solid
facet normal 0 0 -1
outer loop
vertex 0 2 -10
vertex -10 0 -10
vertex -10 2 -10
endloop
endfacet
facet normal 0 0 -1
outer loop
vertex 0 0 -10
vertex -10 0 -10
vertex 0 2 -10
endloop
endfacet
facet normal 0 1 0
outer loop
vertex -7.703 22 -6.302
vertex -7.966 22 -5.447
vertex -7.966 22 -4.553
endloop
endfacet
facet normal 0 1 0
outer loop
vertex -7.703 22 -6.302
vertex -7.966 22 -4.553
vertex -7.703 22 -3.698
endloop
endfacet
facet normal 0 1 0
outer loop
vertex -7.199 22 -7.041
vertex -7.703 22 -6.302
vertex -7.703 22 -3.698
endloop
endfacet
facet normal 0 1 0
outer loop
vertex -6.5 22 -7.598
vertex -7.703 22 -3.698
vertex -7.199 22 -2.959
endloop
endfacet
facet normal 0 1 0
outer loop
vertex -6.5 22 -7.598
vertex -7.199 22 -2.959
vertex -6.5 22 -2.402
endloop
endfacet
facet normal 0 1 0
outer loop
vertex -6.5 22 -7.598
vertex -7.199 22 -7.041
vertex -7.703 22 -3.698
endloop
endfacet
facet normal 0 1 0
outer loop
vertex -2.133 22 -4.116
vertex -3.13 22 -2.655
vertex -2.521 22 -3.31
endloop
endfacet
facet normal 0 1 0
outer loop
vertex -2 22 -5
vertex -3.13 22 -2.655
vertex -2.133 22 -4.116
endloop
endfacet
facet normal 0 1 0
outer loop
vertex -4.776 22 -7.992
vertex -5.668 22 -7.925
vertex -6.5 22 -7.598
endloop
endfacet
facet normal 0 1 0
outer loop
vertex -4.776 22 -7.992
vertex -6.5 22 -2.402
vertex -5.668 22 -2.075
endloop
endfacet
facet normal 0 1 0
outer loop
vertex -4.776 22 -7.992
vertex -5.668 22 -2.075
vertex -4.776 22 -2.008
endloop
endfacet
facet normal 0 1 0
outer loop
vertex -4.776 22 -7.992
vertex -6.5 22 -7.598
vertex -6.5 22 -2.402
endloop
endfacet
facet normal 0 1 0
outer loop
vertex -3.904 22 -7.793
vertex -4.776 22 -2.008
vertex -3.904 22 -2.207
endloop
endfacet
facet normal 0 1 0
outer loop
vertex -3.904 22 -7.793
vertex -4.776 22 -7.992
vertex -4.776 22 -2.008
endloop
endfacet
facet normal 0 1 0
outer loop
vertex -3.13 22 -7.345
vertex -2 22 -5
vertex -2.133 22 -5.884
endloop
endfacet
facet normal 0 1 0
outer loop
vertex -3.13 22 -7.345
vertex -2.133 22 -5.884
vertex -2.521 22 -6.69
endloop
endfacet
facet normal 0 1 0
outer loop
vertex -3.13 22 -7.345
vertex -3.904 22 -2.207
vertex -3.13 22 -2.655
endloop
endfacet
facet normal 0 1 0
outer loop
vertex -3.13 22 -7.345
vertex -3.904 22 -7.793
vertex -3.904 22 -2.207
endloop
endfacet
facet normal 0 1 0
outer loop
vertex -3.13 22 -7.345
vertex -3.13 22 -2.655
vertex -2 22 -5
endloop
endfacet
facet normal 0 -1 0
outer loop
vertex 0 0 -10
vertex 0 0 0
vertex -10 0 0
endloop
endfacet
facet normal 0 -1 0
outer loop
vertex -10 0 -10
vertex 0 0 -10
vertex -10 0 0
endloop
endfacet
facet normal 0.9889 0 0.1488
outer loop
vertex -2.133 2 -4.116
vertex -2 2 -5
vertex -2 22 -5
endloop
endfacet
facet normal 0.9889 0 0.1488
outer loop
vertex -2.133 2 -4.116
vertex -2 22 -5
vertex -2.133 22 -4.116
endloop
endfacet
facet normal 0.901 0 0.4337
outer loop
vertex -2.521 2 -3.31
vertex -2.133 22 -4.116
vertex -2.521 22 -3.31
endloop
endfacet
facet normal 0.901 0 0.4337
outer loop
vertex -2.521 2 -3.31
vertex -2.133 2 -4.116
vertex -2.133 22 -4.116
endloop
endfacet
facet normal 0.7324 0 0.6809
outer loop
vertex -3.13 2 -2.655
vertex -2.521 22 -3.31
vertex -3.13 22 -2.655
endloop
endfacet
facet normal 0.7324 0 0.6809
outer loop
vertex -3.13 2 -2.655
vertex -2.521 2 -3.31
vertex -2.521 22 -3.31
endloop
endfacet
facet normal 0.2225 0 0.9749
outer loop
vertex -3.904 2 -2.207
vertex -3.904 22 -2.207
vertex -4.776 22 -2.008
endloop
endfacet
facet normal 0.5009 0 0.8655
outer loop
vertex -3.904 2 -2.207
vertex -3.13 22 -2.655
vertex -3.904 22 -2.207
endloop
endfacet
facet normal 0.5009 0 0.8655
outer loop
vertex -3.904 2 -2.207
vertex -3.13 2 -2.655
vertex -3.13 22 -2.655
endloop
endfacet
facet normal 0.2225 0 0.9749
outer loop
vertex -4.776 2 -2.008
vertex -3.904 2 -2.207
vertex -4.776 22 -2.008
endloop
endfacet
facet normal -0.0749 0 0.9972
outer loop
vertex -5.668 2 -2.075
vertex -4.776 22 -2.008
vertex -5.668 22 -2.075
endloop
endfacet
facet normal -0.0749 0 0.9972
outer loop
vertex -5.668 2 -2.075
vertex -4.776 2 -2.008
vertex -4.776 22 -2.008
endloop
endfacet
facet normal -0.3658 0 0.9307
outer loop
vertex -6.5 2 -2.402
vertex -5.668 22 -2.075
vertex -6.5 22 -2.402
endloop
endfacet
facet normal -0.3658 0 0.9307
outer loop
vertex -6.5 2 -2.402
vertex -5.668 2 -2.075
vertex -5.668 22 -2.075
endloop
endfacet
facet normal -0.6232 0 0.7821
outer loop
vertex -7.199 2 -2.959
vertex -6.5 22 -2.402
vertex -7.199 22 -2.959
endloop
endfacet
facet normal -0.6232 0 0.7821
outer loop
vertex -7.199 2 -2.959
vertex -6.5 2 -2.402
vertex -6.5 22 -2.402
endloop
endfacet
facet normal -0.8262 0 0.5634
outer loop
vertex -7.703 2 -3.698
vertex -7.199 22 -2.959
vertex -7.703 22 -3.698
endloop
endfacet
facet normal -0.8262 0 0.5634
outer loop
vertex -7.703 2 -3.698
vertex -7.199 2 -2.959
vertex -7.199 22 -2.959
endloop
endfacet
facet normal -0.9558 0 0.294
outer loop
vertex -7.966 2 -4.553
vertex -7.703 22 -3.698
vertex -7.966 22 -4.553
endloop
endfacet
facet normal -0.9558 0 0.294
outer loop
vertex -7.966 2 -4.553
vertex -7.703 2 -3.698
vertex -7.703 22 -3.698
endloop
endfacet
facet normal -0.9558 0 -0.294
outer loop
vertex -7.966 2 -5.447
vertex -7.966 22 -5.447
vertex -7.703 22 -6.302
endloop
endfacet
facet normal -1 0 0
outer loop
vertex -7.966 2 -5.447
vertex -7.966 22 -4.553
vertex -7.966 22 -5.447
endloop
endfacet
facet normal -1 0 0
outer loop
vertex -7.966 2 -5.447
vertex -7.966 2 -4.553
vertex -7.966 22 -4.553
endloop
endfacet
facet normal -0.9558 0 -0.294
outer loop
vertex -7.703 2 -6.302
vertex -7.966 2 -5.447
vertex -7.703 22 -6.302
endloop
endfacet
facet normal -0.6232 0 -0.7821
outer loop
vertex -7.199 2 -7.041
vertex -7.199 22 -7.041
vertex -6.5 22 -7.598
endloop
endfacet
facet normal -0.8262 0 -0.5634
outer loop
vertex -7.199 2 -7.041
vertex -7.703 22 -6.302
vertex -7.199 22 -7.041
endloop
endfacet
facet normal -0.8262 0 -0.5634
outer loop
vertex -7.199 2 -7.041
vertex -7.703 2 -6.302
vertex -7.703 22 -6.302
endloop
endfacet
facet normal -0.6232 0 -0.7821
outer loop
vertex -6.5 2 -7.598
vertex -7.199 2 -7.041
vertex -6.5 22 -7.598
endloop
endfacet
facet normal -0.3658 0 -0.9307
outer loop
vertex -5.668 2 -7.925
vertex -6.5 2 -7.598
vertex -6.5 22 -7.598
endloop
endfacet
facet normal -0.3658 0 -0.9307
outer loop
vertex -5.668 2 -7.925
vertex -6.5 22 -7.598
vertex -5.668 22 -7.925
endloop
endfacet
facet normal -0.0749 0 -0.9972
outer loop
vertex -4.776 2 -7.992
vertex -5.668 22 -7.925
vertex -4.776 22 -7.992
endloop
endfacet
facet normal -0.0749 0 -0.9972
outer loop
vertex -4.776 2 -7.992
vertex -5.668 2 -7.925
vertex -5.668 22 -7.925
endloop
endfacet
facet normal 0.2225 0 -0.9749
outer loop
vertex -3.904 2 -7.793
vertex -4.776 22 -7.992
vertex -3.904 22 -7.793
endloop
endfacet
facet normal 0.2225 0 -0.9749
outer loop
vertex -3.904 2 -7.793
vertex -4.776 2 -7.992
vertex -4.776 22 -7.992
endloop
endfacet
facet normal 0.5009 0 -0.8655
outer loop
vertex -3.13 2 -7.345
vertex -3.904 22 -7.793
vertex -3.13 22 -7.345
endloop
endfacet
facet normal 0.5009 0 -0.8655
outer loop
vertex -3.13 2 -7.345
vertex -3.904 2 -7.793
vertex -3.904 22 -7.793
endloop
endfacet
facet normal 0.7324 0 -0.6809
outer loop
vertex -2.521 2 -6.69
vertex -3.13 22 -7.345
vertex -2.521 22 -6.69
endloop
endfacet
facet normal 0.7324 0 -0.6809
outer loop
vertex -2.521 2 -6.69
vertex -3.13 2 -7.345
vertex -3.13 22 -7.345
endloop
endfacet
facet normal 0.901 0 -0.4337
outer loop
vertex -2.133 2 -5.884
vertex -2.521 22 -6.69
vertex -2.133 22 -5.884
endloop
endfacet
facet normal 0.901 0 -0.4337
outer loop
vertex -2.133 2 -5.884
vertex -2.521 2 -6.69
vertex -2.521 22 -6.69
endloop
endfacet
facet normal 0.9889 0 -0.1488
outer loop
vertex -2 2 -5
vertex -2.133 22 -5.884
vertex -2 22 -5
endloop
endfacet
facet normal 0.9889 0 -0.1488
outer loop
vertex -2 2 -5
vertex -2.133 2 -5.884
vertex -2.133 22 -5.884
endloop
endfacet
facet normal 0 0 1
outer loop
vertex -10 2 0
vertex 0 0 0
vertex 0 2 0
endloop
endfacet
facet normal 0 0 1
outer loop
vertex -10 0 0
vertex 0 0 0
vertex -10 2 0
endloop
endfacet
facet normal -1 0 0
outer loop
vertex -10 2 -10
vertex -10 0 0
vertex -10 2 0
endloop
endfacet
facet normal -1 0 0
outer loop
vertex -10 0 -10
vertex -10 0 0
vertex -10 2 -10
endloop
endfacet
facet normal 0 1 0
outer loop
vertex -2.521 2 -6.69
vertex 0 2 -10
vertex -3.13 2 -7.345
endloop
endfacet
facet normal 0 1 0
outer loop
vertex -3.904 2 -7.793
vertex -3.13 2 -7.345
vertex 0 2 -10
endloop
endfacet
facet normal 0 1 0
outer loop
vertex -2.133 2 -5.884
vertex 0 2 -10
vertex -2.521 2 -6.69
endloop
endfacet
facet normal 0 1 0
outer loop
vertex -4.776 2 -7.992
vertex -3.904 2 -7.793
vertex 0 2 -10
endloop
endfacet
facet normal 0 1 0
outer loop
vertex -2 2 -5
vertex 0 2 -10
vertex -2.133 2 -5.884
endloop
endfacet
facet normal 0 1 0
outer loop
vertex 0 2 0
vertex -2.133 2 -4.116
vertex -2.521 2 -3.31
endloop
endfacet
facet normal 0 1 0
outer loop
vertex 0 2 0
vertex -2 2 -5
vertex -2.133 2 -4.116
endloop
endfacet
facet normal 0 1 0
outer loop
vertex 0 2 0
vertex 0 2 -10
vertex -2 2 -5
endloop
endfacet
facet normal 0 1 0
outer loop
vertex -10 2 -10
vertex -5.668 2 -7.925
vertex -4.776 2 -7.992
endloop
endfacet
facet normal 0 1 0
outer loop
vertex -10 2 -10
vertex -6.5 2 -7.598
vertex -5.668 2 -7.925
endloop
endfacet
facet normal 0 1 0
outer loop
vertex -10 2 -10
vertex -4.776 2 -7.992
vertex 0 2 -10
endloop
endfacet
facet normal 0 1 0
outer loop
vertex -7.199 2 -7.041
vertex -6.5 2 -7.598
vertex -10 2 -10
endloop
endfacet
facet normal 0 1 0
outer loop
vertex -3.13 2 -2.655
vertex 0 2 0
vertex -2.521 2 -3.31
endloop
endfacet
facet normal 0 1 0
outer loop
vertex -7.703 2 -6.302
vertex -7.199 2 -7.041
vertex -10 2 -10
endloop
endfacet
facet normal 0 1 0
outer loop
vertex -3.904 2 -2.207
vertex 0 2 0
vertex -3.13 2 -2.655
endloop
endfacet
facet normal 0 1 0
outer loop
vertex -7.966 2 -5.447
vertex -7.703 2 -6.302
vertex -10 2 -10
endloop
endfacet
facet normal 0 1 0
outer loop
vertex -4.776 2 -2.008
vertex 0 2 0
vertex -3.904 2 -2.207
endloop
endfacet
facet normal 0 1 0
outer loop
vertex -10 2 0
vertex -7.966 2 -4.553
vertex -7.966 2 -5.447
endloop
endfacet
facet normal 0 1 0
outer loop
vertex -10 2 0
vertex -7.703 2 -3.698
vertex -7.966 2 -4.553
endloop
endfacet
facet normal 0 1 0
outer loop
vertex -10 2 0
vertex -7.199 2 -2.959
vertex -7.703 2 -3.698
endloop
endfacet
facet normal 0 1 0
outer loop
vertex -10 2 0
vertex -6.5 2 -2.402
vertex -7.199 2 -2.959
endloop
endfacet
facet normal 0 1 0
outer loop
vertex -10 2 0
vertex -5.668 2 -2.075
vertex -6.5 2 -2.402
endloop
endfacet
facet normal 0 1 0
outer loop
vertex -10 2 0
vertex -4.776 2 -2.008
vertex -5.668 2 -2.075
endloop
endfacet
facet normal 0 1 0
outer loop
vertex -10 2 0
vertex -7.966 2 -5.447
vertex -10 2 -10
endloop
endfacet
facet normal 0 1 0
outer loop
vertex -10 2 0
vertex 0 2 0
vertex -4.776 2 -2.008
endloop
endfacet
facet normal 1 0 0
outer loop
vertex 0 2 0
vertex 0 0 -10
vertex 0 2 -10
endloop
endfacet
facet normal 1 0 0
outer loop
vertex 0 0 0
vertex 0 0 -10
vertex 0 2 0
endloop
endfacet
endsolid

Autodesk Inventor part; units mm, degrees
ref_plane "YZ Plane" through (0, 0, 0) normal (1, 0, 0) x (0, 1, 0)
ref_plane "XZ Plane" through (0, 0, 0) normal (0, 1, 0) x (-1, 0, 0)
ref_plane "XY Plane" through (0, 0, 0) normal (0, 0, 1) x (1, 0, 0)
sketch "Sketch1" plane through (0, 0, 0) normal (0, 1, 0) x (-1, 0, 0)
  line L0 (0, 0) -> (10, 0)
  line L1 (10, 0) -> (10, -10)
  line L2 (10, -10) -> (0, -10)
  line L3 (0, -10) -> (0, 0)
  dimension "d0" = 10
  dimension "d1" = 10
extrude "Extrusion1" add sketch "Sketch1" along normal blind 2
sketch "Sketch2" plane through (0, 2, 0) normal (0, 1, 0) x (1, 0, 0)
  circle A0 centre (-5, 5) radius 3
  point P0 (0, 0)
  dimension "d4" = 6
  dimension "d5" = 5
  dimension "d6" = 5
extrude "Extrusion2" add sketch "Sketch2" along normal blind 20
properties part number "MouldSeparator"
